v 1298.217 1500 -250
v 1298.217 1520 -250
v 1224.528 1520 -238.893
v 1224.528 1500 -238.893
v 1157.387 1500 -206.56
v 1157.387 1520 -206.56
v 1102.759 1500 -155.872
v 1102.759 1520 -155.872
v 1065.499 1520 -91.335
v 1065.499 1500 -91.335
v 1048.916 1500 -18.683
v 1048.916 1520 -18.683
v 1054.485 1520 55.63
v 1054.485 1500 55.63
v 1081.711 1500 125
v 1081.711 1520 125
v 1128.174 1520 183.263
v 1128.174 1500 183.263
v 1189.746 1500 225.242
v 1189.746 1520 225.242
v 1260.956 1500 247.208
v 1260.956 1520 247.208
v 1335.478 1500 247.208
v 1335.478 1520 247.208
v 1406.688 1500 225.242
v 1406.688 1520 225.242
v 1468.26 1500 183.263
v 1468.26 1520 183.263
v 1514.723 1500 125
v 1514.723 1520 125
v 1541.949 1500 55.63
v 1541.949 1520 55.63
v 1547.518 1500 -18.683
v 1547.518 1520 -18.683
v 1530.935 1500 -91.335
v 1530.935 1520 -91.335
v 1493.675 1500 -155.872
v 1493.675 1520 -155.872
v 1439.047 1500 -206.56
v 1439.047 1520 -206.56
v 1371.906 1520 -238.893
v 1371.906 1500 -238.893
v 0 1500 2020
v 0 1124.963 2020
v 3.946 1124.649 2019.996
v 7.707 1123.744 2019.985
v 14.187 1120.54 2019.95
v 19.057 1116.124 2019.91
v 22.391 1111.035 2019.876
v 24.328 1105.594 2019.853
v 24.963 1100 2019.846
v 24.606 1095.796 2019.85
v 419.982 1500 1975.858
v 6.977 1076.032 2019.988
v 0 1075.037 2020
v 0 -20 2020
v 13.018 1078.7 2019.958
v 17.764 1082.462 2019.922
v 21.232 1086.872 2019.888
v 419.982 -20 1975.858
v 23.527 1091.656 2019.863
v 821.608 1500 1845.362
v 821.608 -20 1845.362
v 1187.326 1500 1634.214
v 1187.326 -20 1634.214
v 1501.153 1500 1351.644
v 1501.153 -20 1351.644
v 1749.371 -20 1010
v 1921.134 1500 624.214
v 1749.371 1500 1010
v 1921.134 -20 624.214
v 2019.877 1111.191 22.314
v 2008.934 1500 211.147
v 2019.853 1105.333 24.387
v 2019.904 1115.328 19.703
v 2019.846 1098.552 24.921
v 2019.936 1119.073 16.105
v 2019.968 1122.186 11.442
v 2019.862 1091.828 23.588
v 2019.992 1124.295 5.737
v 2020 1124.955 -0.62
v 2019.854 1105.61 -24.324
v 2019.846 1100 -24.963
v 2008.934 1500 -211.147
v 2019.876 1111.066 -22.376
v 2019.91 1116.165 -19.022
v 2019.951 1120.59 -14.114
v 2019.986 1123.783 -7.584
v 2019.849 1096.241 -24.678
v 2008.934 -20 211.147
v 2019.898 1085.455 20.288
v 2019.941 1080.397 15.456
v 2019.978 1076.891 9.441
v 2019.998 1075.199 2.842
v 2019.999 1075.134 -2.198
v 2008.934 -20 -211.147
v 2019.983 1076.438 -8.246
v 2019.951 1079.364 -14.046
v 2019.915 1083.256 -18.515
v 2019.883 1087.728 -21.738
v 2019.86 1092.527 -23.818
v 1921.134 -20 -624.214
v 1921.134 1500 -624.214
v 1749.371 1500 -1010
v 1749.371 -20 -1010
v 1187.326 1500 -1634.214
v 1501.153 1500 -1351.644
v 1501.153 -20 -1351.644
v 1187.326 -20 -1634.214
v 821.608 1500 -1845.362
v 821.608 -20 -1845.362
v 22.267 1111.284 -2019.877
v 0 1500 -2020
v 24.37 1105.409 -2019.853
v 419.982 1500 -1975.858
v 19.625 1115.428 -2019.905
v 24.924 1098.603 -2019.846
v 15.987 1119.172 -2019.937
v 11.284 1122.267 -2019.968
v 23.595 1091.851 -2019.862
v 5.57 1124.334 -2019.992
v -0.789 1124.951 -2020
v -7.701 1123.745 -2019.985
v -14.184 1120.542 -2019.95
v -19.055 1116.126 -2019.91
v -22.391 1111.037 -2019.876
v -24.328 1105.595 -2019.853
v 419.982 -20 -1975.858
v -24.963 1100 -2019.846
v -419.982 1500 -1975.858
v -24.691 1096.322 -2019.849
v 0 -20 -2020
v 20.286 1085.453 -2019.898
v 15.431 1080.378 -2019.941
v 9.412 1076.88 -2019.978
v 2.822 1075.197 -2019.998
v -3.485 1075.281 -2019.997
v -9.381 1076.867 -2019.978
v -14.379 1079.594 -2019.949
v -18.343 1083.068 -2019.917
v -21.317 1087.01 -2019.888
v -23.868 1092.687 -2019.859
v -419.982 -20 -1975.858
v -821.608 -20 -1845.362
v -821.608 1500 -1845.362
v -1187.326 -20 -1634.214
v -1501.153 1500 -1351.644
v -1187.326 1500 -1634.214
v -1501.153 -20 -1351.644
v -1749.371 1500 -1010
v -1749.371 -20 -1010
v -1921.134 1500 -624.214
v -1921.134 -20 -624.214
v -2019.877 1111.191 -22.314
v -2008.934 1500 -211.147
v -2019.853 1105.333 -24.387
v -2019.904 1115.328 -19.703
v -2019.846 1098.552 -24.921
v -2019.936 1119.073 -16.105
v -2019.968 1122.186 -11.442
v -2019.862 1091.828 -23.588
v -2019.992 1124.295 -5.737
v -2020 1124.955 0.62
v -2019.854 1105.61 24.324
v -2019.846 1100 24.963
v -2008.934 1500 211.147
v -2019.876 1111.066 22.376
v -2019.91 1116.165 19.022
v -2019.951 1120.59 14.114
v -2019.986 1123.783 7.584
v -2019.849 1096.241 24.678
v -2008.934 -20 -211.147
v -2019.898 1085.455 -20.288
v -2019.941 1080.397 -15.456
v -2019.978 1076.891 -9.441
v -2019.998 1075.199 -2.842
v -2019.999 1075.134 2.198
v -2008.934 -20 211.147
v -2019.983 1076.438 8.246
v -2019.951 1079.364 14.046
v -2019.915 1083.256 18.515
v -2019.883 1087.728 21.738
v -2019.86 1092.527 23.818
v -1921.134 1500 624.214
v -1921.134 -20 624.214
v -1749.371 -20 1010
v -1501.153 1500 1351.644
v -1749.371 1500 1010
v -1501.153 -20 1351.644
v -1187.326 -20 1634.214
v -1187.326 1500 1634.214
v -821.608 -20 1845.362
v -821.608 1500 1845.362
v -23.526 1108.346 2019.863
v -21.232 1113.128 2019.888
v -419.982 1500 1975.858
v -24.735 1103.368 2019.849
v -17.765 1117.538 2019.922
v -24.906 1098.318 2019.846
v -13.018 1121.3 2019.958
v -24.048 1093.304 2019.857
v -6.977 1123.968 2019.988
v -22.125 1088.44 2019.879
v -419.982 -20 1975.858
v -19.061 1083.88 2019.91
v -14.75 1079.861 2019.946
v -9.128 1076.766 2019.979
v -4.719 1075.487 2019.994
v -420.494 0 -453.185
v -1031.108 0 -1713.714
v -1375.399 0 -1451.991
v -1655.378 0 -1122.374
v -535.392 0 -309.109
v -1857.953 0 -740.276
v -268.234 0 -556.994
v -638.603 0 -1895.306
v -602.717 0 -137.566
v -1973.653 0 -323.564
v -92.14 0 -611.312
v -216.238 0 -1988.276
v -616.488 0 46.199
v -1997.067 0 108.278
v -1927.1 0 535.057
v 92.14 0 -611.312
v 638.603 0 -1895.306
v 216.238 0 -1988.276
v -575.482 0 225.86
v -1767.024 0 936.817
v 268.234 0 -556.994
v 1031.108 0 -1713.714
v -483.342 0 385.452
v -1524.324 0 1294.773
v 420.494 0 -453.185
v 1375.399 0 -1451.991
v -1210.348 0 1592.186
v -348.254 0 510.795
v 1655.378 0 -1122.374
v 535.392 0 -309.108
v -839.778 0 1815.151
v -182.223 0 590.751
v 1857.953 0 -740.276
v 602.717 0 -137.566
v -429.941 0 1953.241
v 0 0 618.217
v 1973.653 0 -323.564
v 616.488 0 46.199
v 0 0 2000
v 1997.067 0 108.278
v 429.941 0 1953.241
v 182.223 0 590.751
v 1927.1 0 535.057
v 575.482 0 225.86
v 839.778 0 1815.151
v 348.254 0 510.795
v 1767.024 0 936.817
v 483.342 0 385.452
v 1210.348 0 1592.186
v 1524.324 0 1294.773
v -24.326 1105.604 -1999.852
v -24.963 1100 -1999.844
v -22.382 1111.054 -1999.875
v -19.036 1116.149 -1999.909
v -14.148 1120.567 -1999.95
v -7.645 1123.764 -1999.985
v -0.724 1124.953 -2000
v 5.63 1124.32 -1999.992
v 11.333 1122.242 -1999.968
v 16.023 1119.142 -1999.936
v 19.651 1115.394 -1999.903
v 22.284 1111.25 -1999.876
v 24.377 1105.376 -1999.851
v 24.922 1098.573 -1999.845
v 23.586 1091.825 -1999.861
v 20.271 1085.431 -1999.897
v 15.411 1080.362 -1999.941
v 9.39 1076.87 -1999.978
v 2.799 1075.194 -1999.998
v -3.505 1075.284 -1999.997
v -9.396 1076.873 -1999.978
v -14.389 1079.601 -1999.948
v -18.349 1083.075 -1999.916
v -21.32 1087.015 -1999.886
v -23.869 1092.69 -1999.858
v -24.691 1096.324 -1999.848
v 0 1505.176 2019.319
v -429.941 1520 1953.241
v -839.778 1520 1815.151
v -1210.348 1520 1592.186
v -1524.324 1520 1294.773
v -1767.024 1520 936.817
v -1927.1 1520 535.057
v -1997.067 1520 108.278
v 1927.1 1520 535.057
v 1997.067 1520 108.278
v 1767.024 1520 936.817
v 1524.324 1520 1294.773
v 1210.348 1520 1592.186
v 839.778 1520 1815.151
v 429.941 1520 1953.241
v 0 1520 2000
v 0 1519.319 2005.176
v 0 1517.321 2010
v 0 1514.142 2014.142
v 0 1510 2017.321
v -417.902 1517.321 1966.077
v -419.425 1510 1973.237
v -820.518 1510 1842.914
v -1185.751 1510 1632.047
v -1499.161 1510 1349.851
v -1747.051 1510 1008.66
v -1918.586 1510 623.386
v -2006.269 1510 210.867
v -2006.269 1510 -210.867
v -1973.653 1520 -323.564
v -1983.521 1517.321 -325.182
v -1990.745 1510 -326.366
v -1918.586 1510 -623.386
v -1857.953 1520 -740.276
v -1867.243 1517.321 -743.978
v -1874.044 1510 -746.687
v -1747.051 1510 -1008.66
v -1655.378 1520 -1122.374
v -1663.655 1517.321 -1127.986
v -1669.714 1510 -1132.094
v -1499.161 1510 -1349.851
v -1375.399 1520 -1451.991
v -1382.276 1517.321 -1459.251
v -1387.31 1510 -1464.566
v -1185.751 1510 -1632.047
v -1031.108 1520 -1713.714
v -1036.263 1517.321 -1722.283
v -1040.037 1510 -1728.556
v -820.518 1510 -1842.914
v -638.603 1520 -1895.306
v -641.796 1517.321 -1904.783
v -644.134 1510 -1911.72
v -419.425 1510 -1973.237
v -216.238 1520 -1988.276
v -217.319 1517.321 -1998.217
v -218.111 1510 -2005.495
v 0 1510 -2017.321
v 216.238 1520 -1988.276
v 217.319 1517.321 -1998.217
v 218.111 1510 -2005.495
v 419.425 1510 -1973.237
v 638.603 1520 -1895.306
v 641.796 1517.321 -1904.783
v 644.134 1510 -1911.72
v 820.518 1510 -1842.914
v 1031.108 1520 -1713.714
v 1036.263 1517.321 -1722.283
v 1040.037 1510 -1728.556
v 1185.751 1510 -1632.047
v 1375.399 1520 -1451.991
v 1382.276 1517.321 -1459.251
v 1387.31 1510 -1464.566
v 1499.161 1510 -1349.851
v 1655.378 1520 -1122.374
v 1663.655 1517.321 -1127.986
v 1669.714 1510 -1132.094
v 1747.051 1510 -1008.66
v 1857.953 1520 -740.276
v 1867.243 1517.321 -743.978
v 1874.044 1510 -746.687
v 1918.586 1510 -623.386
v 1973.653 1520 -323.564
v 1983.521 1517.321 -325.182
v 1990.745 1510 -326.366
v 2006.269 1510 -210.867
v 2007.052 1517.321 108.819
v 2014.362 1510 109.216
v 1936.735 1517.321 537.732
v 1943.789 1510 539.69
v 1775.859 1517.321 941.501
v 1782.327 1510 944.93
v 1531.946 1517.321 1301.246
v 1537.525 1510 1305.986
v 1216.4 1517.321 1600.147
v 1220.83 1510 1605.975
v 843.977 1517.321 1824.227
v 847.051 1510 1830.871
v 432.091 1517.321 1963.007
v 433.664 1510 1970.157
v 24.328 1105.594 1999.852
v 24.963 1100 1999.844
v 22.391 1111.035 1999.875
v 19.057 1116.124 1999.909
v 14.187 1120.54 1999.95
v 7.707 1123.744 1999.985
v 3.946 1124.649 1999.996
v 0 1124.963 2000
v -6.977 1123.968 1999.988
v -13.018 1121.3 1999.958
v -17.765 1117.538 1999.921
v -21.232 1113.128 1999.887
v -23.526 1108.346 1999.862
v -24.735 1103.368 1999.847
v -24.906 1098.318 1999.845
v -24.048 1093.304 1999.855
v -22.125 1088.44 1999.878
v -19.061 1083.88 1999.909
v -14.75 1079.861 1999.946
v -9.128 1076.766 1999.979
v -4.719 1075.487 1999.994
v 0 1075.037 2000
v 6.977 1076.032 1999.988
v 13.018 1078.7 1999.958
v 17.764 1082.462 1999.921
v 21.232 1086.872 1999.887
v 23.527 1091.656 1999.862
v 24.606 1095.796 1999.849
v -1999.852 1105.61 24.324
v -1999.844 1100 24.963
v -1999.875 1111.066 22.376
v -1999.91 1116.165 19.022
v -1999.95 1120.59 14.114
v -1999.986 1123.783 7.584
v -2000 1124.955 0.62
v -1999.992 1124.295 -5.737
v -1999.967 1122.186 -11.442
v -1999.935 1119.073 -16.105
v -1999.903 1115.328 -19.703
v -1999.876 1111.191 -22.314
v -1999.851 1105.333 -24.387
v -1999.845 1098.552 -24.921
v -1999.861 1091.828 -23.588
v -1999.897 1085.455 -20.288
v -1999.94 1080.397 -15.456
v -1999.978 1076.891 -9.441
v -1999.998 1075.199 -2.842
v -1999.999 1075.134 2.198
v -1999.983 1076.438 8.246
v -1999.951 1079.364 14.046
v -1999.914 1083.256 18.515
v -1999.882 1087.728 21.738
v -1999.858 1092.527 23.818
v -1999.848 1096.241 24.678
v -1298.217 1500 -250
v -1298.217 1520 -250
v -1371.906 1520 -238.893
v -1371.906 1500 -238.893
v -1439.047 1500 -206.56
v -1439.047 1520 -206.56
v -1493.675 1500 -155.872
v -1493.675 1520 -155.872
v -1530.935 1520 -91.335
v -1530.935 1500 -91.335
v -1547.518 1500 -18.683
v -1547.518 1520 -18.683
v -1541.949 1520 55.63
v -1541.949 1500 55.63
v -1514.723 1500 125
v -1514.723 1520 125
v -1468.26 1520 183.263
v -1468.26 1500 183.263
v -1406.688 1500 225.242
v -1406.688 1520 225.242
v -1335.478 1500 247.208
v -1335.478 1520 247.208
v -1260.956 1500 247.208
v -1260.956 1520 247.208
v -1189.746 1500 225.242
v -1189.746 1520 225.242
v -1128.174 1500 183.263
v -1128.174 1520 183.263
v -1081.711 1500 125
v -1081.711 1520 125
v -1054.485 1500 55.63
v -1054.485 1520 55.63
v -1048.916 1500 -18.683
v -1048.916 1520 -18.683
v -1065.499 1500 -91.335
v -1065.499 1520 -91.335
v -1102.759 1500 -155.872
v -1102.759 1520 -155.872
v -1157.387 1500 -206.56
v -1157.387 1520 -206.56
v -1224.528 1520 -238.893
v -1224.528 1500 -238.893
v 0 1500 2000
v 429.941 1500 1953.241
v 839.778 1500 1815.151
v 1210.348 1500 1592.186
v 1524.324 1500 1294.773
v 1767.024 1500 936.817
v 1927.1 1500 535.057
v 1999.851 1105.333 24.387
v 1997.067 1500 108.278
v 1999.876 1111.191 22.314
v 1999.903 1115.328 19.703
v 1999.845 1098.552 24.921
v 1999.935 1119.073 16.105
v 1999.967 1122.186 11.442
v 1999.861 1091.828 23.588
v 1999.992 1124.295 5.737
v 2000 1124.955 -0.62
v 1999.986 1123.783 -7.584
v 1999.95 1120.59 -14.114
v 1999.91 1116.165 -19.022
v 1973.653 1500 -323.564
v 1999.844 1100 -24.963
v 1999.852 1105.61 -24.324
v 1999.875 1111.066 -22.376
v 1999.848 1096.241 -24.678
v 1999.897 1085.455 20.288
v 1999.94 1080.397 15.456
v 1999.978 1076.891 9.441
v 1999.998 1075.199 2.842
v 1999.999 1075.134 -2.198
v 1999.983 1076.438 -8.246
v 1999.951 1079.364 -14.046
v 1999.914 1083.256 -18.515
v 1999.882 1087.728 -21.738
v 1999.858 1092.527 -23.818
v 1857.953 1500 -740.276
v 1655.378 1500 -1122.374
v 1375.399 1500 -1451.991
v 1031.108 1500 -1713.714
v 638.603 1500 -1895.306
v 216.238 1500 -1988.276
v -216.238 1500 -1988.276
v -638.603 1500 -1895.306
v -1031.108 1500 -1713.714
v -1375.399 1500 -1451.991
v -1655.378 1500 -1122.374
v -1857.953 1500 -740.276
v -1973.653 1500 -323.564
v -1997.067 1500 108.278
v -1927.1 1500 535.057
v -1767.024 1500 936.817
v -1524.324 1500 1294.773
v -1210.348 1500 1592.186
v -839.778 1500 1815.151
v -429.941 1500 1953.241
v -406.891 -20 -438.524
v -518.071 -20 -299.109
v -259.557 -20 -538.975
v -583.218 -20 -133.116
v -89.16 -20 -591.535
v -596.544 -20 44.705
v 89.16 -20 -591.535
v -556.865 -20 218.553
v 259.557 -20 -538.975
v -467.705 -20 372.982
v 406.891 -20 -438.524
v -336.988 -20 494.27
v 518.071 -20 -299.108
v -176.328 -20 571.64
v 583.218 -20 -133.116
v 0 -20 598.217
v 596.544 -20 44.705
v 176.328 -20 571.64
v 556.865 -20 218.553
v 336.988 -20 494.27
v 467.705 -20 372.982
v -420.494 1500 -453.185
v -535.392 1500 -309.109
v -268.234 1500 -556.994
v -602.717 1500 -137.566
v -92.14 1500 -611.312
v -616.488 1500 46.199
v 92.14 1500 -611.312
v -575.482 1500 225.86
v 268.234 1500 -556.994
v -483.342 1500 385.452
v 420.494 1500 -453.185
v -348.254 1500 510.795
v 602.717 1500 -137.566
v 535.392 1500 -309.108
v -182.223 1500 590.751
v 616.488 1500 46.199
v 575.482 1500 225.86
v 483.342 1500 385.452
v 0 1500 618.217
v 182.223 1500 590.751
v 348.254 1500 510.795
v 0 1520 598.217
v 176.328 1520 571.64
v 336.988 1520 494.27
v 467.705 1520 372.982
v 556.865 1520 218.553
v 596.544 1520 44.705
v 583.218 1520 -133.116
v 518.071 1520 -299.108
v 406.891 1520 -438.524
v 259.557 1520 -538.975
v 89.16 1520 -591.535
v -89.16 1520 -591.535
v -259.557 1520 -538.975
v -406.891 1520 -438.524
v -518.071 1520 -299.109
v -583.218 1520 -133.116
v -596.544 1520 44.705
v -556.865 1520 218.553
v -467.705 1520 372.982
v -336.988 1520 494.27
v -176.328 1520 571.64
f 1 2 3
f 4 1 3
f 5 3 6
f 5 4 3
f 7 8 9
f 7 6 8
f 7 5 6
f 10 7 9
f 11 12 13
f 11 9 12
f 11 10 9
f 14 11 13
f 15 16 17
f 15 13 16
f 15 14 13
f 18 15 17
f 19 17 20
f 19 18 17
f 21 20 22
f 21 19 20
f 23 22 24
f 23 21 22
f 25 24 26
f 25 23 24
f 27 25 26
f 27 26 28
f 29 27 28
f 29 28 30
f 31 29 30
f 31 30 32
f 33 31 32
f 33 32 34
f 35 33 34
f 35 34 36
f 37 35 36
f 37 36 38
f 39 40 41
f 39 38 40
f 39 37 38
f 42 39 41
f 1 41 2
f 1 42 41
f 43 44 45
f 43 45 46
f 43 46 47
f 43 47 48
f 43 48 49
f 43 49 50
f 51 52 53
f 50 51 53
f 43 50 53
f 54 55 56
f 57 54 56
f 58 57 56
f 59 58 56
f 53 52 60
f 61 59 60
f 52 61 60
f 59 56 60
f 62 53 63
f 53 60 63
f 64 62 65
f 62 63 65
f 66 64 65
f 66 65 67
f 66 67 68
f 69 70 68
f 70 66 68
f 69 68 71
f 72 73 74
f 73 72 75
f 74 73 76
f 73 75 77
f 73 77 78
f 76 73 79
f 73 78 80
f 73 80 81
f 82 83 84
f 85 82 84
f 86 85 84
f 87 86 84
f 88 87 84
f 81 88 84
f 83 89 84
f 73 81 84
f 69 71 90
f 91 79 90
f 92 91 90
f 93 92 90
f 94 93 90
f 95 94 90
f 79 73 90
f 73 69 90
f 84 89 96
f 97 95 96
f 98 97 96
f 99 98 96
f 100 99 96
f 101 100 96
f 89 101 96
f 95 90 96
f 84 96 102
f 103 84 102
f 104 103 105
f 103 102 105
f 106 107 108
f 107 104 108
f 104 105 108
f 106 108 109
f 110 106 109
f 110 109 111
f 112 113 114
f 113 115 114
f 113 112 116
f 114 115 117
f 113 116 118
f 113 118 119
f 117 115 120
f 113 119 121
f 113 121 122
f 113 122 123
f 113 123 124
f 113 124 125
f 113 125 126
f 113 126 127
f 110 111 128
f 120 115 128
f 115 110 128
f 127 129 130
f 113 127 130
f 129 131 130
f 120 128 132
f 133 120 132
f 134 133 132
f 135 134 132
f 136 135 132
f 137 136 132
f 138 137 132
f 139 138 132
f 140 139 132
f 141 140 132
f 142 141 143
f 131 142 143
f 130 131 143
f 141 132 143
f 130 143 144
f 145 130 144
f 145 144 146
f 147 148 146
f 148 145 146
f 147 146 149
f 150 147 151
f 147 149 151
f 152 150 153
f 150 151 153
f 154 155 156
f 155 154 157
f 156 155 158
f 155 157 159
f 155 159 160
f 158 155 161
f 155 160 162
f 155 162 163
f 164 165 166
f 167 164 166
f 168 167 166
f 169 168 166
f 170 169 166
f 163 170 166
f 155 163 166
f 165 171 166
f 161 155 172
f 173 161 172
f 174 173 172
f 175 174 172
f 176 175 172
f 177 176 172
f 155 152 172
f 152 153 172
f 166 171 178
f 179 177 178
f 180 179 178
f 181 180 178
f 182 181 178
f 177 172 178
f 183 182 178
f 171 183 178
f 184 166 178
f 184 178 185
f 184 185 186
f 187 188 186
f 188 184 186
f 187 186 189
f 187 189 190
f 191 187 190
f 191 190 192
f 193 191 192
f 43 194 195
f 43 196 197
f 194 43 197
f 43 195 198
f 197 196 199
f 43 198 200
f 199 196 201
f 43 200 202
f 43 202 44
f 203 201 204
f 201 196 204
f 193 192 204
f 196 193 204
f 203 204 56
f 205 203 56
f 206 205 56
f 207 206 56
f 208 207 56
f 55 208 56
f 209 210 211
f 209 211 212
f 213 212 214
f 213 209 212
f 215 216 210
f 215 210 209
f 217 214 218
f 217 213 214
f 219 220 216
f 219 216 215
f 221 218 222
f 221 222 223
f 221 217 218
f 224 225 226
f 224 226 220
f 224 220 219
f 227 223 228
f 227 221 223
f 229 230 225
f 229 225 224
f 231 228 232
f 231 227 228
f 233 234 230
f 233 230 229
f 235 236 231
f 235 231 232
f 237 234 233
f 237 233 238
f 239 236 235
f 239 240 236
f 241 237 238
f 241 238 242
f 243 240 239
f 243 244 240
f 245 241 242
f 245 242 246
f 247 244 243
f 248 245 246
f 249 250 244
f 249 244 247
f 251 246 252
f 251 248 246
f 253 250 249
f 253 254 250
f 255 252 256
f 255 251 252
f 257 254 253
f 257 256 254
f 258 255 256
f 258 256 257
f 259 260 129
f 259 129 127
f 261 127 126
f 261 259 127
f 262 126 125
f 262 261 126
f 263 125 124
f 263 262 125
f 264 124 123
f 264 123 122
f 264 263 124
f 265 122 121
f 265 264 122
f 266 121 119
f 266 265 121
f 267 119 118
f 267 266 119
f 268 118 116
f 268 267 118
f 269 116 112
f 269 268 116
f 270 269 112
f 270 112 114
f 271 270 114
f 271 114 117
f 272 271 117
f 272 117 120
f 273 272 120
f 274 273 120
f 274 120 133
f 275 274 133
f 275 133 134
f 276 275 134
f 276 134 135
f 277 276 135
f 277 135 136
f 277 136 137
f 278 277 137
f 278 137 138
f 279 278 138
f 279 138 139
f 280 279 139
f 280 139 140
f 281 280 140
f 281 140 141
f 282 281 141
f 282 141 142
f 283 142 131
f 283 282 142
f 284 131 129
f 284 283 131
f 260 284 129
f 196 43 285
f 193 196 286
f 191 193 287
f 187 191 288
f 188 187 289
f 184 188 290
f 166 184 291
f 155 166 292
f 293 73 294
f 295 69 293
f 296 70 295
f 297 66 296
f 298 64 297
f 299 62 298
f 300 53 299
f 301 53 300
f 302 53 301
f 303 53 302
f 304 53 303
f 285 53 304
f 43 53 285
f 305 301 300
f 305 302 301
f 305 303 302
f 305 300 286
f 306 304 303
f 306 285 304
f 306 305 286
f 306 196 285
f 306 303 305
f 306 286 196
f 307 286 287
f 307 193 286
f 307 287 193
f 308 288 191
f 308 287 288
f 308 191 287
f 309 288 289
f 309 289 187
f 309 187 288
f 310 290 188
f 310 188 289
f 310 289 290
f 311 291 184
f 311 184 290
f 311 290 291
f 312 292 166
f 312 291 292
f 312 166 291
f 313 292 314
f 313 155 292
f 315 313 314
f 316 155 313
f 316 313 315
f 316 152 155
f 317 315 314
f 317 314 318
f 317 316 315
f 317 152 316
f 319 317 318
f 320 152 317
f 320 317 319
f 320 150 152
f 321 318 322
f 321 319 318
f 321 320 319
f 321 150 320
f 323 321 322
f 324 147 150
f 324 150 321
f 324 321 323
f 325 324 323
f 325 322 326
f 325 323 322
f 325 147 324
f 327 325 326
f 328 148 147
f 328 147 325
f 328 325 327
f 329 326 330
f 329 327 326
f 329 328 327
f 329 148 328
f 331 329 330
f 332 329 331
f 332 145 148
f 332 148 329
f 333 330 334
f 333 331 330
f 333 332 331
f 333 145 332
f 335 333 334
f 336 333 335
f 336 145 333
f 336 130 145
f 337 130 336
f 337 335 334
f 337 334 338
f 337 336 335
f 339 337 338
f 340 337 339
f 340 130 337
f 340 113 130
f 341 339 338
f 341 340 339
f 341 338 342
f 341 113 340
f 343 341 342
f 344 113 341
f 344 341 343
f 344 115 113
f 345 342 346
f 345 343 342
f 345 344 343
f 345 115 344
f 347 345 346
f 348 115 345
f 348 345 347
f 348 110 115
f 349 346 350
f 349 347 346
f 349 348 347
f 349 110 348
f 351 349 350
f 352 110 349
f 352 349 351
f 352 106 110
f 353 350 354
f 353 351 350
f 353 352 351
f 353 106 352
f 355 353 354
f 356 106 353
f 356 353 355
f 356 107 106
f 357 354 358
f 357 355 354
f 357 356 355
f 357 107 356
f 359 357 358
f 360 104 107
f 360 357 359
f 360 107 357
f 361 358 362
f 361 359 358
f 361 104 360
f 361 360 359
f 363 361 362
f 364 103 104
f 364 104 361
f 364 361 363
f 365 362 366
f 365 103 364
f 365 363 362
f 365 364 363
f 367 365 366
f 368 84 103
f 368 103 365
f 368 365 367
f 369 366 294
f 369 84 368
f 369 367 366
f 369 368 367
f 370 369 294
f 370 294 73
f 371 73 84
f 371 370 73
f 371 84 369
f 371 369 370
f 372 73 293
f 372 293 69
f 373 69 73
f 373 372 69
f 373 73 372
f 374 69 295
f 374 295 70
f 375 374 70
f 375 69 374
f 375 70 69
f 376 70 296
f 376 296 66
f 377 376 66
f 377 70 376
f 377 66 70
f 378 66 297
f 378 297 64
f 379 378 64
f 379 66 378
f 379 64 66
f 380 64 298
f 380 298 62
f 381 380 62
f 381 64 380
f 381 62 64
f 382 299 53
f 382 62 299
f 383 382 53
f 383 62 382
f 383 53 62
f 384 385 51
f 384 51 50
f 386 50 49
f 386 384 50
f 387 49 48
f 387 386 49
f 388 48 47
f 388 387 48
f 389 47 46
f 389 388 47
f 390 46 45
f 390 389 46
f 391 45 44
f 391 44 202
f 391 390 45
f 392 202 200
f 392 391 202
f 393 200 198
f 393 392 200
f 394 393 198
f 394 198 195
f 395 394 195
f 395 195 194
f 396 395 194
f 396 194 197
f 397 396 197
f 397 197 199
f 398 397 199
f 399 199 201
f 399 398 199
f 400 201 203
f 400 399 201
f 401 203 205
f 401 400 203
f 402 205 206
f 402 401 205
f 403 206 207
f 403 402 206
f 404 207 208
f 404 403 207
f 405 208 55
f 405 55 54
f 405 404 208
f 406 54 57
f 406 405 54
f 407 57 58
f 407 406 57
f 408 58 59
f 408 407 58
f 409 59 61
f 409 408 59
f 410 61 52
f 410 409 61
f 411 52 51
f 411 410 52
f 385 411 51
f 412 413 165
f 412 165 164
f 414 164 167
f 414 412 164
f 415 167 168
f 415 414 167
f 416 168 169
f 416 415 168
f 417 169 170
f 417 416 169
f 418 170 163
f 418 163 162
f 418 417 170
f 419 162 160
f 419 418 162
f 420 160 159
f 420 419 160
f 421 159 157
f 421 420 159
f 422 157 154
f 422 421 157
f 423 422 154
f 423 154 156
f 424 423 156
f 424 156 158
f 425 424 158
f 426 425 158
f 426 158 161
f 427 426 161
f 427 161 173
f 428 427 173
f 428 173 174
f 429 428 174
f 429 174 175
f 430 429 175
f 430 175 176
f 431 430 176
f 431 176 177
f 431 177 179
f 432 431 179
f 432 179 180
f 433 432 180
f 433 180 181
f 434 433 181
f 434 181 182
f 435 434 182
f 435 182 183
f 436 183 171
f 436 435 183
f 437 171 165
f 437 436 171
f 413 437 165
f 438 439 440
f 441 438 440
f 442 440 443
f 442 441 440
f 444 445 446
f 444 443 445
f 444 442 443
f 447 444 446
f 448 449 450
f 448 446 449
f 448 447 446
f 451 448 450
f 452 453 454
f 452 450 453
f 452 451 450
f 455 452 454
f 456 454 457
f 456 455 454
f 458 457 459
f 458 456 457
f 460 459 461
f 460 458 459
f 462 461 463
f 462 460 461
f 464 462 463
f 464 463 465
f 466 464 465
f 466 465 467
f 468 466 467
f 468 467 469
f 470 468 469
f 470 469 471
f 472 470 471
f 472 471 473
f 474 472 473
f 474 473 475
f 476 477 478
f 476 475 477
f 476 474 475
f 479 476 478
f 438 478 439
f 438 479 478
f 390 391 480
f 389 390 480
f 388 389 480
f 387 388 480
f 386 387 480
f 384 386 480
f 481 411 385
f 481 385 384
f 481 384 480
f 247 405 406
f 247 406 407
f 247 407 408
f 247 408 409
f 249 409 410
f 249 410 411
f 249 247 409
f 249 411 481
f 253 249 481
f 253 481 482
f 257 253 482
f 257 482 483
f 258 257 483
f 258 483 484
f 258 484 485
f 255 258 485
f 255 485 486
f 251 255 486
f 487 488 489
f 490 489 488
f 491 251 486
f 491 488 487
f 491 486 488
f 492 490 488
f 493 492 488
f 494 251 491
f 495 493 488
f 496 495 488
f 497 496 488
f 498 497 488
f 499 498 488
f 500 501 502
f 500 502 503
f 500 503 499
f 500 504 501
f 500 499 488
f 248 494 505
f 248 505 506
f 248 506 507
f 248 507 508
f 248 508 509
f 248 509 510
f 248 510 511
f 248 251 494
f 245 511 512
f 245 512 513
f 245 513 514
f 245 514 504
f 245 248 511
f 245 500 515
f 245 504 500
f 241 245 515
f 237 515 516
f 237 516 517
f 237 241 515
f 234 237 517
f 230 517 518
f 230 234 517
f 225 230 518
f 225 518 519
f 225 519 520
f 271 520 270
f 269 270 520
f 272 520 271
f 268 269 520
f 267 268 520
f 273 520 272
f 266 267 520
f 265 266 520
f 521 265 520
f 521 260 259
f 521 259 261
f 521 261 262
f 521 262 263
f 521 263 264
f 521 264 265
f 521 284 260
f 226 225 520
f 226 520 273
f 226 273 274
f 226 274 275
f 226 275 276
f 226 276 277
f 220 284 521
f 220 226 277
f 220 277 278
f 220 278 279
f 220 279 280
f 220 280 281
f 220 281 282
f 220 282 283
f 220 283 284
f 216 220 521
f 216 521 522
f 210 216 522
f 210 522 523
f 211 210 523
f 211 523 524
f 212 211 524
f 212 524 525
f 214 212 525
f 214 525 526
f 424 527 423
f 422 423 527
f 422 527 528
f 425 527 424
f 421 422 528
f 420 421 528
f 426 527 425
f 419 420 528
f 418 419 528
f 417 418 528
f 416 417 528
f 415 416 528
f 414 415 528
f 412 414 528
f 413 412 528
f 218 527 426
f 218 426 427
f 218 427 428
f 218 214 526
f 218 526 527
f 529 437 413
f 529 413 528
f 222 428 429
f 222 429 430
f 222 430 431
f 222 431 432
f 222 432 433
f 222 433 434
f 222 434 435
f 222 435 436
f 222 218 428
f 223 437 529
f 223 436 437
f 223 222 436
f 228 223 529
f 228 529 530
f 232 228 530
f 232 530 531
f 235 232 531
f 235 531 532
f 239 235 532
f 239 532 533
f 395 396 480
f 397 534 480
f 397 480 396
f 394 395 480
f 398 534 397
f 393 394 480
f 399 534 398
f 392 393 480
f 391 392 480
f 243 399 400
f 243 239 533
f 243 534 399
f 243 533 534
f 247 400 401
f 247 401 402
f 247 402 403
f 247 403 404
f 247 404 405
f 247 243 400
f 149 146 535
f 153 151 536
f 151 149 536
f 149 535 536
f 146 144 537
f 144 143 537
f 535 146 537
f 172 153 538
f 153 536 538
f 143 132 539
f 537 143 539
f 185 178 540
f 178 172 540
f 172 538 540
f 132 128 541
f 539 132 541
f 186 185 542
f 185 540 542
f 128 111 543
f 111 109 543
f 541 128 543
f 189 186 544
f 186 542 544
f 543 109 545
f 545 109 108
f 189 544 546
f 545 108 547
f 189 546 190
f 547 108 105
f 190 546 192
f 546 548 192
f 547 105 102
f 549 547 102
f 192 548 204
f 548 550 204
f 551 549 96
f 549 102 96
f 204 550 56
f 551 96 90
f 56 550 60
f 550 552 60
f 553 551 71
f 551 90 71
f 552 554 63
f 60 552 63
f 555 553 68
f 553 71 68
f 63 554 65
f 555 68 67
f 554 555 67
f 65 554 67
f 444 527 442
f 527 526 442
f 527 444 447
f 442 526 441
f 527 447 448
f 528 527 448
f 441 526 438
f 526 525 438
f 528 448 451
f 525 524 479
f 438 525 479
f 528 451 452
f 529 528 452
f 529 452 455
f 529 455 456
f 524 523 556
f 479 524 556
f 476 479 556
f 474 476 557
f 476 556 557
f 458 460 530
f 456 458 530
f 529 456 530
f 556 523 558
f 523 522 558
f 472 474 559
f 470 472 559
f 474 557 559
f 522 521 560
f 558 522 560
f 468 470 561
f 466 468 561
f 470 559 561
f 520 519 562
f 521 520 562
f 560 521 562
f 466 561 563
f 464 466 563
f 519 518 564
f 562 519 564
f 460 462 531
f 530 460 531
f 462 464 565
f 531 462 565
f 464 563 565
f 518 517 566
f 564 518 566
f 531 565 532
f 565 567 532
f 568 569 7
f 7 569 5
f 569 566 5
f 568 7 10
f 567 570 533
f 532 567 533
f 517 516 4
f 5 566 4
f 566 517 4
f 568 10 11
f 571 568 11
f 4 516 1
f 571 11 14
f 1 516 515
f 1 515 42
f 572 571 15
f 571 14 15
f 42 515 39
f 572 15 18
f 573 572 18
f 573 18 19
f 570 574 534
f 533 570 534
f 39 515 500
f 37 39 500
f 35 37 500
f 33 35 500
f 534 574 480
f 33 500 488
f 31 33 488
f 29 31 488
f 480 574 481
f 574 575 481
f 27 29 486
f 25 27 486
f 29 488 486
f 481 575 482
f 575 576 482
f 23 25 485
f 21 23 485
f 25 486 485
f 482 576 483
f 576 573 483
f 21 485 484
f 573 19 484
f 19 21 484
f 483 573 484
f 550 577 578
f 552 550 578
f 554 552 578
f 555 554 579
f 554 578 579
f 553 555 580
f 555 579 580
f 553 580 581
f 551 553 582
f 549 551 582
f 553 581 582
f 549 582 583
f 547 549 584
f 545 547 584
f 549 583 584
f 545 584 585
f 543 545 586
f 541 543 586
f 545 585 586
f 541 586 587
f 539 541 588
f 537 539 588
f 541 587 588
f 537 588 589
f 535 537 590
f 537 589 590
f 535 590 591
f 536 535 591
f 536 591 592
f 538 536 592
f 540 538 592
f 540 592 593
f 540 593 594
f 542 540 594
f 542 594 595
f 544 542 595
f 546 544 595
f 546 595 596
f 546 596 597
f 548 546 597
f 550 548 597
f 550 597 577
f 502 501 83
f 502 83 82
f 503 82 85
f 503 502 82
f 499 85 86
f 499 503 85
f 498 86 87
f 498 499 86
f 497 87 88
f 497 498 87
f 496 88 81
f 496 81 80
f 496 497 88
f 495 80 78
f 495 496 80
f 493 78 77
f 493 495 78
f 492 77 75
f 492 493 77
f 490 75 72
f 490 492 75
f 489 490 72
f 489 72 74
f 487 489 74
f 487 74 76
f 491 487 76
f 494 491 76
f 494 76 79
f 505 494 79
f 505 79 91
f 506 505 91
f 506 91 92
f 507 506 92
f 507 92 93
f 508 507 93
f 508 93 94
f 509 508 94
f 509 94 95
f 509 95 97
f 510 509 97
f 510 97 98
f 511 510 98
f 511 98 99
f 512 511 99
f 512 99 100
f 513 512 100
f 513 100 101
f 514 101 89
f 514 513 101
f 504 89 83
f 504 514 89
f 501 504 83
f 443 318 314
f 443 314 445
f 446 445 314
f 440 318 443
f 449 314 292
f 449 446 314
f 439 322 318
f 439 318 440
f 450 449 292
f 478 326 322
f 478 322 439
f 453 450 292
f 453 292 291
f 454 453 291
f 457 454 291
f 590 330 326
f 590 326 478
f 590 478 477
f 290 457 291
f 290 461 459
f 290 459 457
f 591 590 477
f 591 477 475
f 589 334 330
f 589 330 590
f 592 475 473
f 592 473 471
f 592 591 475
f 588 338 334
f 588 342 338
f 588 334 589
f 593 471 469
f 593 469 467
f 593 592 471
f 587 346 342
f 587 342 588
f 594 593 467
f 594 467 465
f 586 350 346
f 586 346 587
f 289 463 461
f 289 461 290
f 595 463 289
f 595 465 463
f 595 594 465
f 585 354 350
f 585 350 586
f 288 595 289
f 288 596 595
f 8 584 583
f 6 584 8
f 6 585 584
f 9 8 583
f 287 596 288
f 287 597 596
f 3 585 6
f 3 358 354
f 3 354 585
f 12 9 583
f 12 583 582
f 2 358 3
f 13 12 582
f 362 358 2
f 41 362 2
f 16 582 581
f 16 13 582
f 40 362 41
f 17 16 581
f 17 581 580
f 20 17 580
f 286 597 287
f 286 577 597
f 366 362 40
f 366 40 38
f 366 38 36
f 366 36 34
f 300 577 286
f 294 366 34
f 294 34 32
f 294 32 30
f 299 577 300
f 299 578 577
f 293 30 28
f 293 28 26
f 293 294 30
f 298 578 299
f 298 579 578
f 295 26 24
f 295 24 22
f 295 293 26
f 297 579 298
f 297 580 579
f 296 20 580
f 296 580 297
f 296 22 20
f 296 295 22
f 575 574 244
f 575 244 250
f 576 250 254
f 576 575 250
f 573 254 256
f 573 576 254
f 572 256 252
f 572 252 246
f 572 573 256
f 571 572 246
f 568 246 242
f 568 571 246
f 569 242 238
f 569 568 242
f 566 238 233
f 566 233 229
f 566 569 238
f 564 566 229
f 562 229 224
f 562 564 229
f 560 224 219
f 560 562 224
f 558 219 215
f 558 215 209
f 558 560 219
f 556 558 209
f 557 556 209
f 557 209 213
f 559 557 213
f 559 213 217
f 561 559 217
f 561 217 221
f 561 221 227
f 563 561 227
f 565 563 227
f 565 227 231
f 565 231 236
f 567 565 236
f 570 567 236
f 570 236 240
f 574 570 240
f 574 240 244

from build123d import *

# Parameters (mm, degrees)
SKETCH9_R               = 2000
BOSS_EXTRUDE5_DEPTH     = 1500
SKETCH10_R              = 598.217
CUT_EXTRUDE3_DEPTH      = 1500
SHELL6_T                = 20
SKETCH11_R              = 598.217
BOSS_EXTRUDE6_DEPTH     = 1540
BOSS_EXTRUDE7_REACH     = 3247.366
SKETCH13_R              = 618.217
SKETCH14_R              = 598.217
CUT_EXTRUDE5_DEPTH      = 3246.36592698
FILLET2_R               = 20
CUT_EXTRUDE6_DEPTH      = 3246.365927042
CUT_EXTRUDE6_DEPTH_BACK = 547
SKETCH16_R              = 250
CUT_EXTRUDE11_START     = 1700
SKETCH19_R              = 24.963
CUT_EXTRUDE11_DEPTH     = 400
CIRPATTERN1_COUNT       = 4


with BuildPart() as part:
    # Sketch9 → Boss-Extrude5 (new body)
    with BuildSketch(Plane(origin=(0, 0, 0), x_dir=(1, 0, 0), z_dir=(0, 1, 0))):
        with Locations(Location((0, 0, 0), (0, 0, 270))):
            Circle(SKETCH9_R)
    extrude(amount=BOSS_EXTRUDE5_DEPTH)

    # Sketch10 → Cut-Extrude3 (cut)
    with BuildSketch(Plane(origin=(0, 1500, 0), x_dir=(1, 0, 0), z_dir=(0, 1, 0))):
        with Locations(Location((0, 0, 0), (0, 0, 270))):
            Circle(SKETCH10_R)
    extrude(amount=-CUT_EXTRUDE3_DEPTH, mode=Mode.SUBTRACT)

    # Shell6
    shell6_openings = [part.faces().sort_by_distance(p)[0] for p in [
        (0, 750, -598.217),
    ]]
    offset(amount=SHELL6_T, openings=shell6_openings, kind=Kind.INTERSECTION)

    # Sketch11 → Boss-Extrude6 (add, through all)
    with BuildSketch(Plane(origin=(0, 1520, 0), x_dir=(1, 0, 0), z_dir=(0, 1, 0))):
        with Locations(Location((0, 0, 0), (0, 0, 270))):
            Circle(SKETCH11_R)
    extrude(amount=-BOSS_EXTRUDE6_DEPTH)

    # Sketch13 → Boss-Extrude7 (add, up to next)
    with BuildSketch(Plane(origin=(0, 1520, 0), x_dir=(1, 0, 0), z_dir=(0, 1, 0)), mode=Mode.PRIVATE) as boss_extrude7_sk1:
        with Locations(Location((0, 0, 0), (0, 0, 270))):
            Circle(SKETCH13_R)
    boss_extrude7_tool1 = extrude(boss_extrude7_sk1.sketch, amount=-BOSS_EXTRUDE7_REACH, mode=Mode.PRIVATE) - part.part
    add(boss_extrude7_tool1.solids().sort_by_distance((0, 1520, 0))[0])

    # Sketch14 → Cut-Extrude5 (cut, through all)
    with BuildSketch(Plane(origin=(0, 1520, 0), x_dir=(1, 0, 0), z_dir=(0, 1, 0))):
        with Locations(Location((0, 0, 0), (0, 0, 270))):
            Circle(SKETCH14_R)
    extrude(amount=-CUT_EXTRUDE5_DEPTH, mode=Mode.SUBTRACT)

    # Fillet2
    fillet2_edges = [part.edges().sort_by_distance(p)[0] for p in [
        (0, 1520, -2020),
    ]]
    fillet(fillet2_edges, radius=FILLET2_R)

    # Sketch16 → Cut-Extrude6 (cut, two sides: drawn at the far end of the back side and taken through both)
    with BuildSketch(Plane(origin=(0, 1520, 0), x_dir=(1, 0, 0), z_dir=(0, 1, 0)).offset(-CUT_EXTRUDE6_DEPTH_BACK)):
        with Locations(Location((-1298.217, 0, 0), (0, 0, 90))):
            Circle(SKETCH16_R)
        with Locations(Location((1298.217, 0, 0), (0, 0, 90))):
            Circle(SKETCH16_R)
    extrude(amount=CUT_EXTRUDE6_DEPTH + CUT_EXTRUDE6_DEPTH_BACK, mode=Mode.SUBTRACT)

    # Sketch19 → Cut-Extrude11 (cut)
    with BuildSketch(Plane.XY.offset(CUT_EXTRUDE11_START)):
        with Locations((0, 1100)):
            Circle(SKETCH19_R)
    cut_extrude11 = extrude(amount=CUT_EXTRUDE11_DEPTH, mode=Mode.SUBTRACT)

    # CirPattern1: Cut-Extrude11 ×4 about axis
    cirpattern1_axis = Axis((0, 1520, 0), (0, 1, 0))
    for i in range(1, CIRPATTERN1_COUNT):
        add(cut_extrude11.rotate(cirpattern1_axis, i * 360 / CIRPATTERN1_COUNT), mode=Mode.SUBTRACT)


solid = part.part
